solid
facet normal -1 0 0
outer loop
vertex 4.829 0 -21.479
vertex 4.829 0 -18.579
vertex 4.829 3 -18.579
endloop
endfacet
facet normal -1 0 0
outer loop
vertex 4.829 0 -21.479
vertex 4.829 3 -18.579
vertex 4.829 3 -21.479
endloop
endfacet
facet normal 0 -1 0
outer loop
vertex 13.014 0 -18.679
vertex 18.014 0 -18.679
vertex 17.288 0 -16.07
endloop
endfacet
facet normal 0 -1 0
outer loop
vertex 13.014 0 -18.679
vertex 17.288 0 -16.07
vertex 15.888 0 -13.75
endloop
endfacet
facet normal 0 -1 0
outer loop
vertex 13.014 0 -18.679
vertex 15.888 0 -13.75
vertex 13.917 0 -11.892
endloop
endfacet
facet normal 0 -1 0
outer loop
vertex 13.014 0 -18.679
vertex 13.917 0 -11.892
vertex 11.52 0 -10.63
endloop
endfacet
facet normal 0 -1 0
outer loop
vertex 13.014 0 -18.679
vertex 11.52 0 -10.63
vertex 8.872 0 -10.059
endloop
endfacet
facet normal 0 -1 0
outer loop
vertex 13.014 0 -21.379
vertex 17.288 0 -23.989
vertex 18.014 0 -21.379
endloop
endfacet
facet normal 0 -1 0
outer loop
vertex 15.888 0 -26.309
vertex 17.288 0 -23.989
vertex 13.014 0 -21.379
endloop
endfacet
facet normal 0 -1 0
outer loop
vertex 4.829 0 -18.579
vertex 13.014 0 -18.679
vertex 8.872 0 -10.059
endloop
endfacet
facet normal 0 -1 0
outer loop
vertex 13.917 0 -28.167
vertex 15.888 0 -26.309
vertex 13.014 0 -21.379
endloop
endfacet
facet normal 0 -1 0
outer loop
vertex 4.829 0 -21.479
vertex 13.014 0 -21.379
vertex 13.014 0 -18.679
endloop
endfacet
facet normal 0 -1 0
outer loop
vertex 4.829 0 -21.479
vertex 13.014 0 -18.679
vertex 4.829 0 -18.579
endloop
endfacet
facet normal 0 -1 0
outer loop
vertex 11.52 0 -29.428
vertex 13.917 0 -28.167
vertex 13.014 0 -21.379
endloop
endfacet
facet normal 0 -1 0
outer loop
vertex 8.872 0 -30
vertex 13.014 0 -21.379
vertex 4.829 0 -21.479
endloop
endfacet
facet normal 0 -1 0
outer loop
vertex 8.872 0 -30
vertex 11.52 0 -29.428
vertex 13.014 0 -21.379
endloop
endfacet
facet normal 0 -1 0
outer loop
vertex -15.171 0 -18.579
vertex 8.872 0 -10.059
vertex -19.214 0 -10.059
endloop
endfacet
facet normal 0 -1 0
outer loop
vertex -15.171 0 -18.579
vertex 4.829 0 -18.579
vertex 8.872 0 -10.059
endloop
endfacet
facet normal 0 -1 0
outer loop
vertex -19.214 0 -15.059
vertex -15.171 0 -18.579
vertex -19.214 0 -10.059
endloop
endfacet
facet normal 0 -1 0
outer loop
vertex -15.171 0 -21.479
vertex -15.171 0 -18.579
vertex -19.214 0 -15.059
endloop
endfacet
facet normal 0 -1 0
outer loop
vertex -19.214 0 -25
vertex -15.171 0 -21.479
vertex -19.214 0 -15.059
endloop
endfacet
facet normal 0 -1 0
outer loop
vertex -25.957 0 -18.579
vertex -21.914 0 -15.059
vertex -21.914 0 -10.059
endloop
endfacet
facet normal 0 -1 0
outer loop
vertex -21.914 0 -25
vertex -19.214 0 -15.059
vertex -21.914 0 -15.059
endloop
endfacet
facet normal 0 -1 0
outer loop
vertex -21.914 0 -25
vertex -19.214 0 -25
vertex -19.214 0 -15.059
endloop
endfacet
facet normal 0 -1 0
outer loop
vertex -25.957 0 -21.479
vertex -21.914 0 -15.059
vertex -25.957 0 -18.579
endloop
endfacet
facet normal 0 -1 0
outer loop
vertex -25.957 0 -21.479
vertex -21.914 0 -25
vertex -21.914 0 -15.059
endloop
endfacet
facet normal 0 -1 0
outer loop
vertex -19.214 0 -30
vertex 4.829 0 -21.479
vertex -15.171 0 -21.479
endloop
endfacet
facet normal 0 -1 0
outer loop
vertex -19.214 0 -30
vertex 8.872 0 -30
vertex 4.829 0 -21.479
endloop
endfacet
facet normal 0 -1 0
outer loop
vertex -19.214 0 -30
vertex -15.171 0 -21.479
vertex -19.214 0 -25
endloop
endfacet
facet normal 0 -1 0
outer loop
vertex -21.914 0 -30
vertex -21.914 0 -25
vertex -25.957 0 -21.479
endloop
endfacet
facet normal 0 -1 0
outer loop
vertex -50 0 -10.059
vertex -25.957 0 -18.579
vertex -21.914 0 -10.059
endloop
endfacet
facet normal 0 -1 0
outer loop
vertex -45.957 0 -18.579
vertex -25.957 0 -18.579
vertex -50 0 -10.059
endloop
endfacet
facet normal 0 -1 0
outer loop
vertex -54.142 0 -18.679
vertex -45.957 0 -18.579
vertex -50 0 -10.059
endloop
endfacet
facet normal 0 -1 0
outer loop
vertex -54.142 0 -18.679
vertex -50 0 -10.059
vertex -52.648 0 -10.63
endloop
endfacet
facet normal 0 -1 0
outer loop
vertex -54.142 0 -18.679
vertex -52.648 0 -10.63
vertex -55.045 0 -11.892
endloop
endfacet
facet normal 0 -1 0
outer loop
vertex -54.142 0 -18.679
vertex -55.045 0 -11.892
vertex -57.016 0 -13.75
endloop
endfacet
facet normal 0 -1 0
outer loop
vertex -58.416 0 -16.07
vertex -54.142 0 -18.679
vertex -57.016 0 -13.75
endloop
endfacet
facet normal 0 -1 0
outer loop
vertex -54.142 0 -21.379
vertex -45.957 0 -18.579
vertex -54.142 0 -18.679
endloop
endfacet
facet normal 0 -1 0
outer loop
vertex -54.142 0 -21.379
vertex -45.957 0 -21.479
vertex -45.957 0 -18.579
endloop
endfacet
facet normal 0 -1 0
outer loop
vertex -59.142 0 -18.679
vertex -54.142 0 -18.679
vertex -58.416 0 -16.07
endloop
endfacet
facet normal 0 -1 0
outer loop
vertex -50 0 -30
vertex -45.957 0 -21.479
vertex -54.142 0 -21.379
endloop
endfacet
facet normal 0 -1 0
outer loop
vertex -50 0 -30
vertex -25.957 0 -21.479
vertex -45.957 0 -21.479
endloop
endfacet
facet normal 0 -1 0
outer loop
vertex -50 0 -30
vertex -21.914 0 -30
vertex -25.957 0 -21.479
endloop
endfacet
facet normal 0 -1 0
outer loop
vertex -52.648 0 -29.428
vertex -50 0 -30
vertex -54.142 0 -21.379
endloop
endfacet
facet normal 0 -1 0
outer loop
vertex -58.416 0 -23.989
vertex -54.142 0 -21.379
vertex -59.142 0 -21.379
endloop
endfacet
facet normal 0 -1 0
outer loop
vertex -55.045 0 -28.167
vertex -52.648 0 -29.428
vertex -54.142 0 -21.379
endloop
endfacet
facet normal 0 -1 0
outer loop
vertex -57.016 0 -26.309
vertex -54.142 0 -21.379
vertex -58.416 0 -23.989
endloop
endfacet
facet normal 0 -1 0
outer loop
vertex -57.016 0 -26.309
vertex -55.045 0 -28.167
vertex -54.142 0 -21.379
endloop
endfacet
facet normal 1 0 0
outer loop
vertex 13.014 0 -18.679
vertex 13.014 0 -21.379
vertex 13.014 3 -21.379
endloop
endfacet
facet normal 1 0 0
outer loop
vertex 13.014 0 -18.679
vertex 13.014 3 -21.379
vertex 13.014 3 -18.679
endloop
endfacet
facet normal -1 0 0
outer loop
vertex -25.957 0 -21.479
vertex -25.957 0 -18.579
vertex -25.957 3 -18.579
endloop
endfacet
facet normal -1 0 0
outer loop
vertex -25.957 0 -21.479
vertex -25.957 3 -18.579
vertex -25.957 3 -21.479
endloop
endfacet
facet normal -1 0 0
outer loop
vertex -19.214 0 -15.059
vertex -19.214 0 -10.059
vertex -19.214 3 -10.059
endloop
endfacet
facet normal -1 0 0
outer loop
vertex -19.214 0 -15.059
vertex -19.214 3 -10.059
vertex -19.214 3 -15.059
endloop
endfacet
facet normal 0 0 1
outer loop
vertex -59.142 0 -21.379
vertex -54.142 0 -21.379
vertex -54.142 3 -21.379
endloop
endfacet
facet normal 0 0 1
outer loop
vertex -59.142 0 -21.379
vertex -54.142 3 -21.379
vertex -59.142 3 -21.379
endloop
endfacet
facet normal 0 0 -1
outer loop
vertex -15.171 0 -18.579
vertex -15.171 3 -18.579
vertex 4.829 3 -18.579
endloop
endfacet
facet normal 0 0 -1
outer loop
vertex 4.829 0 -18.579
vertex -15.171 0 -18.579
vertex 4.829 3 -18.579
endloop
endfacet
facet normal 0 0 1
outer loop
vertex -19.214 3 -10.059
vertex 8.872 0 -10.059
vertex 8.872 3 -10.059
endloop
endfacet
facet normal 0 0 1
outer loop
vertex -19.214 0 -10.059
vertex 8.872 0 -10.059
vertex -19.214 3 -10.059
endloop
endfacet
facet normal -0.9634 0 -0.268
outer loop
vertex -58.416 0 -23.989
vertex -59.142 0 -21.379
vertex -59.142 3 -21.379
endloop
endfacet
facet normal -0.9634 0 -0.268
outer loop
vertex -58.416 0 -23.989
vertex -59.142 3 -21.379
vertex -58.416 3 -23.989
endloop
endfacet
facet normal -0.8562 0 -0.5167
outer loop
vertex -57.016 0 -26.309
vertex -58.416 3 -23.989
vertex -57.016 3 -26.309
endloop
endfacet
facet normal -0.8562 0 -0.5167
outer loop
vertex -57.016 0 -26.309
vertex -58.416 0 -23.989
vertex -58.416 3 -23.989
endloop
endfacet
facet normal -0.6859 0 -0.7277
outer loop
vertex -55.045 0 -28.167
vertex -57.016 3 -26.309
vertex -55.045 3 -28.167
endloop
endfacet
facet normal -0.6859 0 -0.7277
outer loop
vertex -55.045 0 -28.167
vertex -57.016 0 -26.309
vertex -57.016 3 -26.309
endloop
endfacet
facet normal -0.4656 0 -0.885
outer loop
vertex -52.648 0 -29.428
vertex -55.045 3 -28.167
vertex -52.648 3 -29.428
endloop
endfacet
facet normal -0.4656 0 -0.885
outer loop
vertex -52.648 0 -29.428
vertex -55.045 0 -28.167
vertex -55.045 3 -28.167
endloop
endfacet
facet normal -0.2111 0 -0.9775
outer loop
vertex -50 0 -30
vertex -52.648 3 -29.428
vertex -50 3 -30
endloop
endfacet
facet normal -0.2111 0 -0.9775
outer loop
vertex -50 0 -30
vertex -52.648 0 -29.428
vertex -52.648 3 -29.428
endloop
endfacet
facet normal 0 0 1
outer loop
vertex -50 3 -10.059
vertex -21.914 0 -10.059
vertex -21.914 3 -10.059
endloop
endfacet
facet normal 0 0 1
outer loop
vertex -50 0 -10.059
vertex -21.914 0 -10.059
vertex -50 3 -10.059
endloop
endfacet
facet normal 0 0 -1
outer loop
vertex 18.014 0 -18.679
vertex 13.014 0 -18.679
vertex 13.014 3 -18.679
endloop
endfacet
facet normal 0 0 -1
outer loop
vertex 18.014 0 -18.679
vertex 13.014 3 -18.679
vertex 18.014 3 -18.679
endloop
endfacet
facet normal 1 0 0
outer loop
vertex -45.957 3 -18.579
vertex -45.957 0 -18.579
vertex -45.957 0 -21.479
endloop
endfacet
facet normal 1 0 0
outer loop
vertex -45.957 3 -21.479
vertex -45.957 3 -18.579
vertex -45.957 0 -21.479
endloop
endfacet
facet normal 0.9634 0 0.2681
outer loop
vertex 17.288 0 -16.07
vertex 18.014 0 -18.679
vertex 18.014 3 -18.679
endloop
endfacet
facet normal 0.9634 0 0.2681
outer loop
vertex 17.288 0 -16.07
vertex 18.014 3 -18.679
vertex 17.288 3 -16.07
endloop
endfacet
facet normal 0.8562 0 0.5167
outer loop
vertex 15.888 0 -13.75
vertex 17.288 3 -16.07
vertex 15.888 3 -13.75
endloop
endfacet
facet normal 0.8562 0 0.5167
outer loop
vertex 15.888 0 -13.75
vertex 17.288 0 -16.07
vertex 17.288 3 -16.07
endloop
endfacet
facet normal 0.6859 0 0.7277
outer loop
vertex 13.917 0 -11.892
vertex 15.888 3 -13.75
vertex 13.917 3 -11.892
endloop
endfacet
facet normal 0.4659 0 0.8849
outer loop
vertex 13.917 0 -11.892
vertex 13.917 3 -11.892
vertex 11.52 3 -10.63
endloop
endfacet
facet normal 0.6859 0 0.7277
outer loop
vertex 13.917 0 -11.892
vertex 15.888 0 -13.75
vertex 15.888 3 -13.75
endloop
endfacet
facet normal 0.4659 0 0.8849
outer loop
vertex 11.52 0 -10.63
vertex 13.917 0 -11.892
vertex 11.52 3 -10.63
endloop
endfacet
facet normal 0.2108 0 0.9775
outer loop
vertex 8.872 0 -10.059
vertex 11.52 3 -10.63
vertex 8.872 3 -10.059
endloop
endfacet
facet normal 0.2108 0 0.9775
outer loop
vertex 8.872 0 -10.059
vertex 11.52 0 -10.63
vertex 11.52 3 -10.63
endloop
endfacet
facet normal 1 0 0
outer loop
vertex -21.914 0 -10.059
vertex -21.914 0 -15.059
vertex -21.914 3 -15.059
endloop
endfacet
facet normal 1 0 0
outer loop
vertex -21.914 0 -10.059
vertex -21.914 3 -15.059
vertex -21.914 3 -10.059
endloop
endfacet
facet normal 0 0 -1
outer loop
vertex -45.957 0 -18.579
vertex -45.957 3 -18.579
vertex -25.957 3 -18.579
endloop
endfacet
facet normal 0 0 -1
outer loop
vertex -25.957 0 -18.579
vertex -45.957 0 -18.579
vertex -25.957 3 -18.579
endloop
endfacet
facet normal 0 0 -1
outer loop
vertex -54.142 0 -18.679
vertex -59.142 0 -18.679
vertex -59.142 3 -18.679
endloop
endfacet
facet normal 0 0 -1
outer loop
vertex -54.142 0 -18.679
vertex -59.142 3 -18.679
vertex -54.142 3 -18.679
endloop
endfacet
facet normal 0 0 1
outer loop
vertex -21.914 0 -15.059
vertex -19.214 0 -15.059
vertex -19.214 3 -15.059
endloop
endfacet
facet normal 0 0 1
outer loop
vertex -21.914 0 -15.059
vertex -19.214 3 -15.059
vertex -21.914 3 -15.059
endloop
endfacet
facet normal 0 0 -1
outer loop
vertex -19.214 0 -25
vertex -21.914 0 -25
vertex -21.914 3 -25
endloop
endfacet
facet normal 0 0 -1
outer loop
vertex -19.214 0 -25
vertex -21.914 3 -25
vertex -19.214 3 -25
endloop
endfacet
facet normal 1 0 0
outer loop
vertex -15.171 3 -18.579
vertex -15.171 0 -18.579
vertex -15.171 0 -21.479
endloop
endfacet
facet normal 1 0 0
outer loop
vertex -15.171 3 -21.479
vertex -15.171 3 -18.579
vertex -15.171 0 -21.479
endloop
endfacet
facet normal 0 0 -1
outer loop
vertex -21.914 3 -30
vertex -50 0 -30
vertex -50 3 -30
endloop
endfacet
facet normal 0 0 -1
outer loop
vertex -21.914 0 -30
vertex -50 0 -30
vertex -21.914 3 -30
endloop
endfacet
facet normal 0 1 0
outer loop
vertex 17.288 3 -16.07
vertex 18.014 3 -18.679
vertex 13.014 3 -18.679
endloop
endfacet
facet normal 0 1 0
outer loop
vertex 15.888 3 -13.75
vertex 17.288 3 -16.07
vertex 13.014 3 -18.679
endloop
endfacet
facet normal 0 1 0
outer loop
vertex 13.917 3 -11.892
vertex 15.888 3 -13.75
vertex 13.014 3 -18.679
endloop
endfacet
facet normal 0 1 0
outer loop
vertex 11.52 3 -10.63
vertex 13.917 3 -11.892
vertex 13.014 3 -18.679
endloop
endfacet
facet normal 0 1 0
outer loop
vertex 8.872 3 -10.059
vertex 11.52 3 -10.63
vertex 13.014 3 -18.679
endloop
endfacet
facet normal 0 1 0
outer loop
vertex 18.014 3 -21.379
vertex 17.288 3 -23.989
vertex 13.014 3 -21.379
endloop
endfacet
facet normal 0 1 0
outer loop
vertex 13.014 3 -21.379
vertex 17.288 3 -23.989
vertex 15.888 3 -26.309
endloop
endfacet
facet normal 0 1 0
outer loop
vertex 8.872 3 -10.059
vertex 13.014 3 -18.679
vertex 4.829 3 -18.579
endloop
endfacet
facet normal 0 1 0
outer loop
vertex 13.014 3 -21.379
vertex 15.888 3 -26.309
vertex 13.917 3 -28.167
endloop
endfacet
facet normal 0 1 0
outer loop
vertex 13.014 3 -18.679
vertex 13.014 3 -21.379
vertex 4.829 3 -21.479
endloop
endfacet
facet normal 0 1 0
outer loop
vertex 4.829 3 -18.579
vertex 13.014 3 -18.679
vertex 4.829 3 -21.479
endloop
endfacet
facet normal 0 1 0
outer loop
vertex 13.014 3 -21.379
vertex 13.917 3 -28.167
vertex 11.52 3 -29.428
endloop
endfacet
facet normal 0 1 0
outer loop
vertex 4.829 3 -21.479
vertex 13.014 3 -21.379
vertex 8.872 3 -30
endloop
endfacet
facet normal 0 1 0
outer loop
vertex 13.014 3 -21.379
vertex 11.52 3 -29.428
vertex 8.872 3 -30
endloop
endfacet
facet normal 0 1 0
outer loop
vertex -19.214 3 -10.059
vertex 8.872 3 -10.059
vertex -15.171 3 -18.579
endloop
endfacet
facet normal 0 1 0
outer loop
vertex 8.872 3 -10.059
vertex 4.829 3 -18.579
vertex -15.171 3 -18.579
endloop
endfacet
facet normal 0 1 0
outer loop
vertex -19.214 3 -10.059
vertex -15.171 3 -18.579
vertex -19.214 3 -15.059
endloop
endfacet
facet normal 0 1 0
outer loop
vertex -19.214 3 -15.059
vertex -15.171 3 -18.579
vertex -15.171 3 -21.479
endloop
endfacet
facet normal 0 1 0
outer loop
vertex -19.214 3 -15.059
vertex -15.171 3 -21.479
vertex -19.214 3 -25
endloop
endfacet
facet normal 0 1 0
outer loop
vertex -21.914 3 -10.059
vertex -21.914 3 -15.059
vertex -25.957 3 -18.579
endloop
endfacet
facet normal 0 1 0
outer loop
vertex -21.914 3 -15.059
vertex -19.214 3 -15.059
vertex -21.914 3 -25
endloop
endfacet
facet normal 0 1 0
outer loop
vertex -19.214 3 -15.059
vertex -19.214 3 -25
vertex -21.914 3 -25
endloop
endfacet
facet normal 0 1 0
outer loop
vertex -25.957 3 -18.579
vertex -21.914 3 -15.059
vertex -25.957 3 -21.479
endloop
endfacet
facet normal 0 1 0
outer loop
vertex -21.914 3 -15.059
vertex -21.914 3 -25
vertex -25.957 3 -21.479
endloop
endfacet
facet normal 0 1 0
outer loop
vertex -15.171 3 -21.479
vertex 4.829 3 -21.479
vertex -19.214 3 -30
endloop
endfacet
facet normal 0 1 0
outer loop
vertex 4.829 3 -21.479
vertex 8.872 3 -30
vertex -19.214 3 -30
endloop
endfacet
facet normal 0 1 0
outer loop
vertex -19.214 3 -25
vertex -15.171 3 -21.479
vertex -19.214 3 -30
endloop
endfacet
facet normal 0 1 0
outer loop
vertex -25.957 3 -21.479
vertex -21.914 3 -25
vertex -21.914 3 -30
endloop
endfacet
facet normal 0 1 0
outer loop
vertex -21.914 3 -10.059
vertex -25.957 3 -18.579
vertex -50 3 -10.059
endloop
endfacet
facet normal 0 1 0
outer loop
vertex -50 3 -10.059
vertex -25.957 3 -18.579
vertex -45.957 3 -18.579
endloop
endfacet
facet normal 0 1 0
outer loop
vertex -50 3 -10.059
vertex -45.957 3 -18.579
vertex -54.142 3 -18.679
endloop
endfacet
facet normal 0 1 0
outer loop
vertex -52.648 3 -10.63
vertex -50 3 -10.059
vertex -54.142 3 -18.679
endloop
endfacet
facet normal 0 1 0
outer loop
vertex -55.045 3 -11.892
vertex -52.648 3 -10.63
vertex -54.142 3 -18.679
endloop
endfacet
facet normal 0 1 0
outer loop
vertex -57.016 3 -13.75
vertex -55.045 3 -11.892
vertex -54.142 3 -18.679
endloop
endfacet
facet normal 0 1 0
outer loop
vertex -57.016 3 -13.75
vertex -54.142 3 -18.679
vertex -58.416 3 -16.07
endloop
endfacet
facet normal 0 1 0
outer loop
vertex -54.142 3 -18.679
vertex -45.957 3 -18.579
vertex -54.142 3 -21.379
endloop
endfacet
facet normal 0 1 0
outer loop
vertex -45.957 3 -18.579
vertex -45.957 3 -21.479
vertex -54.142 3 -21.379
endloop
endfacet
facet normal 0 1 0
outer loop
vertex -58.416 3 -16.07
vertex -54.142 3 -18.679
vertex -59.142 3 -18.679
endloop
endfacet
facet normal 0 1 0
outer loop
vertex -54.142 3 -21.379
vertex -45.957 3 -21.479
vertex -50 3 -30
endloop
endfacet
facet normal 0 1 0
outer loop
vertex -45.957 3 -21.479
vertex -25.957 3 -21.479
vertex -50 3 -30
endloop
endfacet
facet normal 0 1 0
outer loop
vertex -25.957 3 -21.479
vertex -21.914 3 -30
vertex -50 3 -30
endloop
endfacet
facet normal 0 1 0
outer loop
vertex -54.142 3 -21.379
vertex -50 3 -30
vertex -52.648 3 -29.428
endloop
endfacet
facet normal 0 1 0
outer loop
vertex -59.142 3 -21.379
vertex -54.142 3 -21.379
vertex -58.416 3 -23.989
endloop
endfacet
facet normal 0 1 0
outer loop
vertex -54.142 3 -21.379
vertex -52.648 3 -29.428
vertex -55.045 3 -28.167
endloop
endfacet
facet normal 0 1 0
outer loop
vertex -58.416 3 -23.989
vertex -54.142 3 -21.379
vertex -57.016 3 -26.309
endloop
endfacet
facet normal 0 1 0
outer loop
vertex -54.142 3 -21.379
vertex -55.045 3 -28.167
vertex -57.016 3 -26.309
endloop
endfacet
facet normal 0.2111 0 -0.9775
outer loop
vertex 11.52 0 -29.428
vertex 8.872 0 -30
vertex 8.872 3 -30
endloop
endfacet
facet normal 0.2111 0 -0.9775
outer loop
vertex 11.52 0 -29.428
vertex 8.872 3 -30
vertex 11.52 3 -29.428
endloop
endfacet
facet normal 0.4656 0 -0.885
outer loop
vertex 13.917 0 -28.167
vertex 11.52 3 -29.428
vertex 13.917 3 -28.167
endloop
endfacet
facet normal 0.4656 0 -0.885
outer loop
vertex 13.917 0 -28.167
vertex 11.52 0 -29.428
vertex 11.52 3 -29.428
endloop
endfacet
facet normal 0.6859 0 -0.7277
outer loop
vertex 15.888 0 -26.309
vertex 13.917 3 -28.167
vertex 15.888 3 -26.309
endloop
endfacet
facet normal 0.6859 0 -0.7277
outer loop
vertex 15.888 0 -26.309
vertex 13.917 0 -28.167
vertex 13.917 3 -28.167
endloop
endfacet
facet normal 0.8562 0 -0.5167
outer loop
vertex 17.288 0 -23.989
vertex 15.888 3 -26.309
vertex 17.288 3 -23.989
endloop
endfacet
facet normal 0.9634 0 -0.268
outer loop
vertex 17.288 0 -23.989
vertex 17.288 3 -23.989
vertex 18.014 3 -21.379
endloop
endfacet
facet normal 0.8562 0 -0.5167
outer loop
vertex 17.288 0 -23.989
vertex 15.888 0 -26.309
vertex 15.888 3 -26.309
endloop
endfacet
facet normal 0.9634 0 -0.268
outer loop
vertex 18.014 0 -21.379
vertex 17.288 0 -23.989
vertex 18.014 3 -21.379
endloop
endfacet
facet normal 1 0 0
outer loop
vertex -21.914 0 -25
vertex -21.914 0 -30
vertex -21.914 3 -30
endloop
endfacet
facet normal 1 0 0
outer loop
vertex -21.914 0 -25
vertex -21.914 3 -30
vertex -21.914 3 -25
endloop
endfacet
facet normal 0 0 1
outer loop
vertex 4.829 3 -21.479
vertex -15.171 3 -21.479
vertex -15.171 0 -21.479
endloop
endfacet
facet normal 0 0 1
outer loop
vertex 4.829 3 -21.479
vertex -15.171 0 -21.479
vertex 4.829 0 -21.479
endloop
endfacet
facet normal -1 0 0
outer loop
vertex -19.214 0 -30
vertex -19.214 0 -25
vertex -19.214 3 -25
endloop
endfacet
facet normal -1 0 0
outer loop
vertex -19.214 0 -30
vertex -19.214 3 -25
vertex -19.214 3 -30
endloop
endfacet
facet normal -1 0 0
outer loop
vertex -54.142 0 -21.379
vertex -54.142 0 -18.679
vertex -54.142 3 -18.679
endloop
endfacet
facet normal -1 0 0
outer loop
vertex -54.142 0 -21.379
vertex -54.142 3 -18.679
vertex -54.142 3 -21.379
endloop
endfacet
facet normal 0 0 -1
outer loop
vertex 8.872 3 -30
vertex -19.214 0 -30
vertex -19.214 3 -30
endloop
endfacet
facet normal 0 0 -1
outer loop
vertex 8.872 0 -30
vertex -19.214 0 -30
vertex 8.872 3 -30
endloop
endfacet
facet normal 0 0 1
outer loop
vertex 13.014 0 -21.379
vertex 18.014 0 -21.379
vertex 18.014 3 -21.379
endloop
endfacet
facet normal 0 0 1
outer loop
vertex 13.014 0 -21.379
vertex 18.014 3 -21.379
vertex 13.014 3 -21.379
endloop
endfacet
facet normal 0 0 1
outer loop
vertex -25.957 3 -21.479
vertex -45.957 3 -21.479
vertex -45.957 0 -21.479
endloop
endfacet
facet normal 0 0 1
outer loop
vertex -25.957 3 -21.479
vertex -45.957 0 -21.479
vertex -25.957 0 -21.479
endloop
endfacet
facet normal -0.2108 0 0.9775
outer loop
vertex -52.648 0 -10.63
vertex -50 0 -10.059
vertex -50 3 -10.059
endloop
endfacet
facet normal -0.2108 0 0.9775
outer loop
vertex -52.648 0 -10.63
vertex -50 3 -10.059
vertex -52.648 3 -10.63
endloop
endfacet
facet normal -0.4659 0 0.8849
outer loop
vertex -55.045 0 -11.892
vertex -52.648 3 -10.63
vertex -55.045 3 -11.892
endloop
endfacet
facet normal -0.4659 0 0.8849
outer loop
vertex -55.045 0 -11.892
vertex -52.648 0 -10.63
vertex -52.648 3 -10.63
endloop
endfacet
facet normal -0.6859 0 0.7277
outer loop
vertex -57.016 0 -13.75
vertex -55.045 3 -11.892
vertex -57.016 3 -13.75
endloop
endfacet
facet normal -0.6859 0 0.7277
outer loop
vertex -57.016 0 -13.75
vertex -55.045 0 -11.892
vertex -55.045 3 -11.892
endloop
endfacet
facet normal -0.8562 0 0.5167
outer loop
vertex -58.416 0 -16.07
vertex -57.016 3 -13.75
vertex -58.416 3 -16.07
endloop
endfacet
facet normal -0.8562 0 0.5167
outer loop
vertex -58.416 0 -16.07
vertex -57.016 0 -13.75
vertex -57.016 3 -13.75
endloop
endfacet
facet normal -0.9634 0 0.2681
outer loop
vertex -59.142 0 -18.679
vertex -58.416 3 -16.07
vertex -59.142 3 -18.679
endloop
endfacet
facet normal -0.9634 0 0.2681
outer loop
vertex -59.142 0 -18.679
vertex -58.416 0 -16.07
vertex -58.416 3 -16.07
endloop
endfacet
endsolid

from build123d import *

# Parameters (mm, degrees)
BOSS_EXTRUDE1_DEPTH = 3
CUT_EXTRUDE1_REACH  = 5
SKETCH2_W           = 20
SKETCH2_H           = 2.9


with BuildPart() as part:
    # Sketch1 → Boss-Extrude1 (new body)
    with BuildSketch(Plane(origin=(0, 0, 0), x_dir=(1, 0, 0), z_dir=(0, 1, 0))):
        with BuildLine():
            Line((-50, 30), (-21.914, 30))
            Line((-21.914, 30), (-21.914, 25))
            Line((-21.914, 25), (-19.214, 25))
            Line((-19.214, 25), (-19.214, 30))
            Line((-19.214, 30), (8.872, 30))
            ThreePointArc((8.872, 30), (14.965992065, 27.304879145), (18.013850136, 21.379427525))
            Line((18.013850136, 21.379427525), (13.013850136, 21.379427525))
            Line((13.013850136, 21.379427525), (13.013850136, 18.679427525))
            Line((13.013850136, 18.679427525), (18.013850136, 18.679427525))
            ThreePointArc((18.013850136, 18.679427525), (14.965992065, 12.753975906), (8.872, 10.058855051))
            Line((8.872, 10.058855051), (-19.214, 10.058855051))
            Line((-19.214, 10.058855051), (-19.214, 15.058855051))
            Line((-19.214, 15.058855051), (-21.914, 15.058855051))
            Line((-21.914, 15.058855051), (-21.914, 10.058855051))
            Line((-21.914, 10.058855051), (-50, 10.058855051))
            ThreePointArc((-50, 10.058855051), (-56.093992065, 12.753975906), (-59.141850136, 18.679427525))
            Line((-59.141850136, 18.679427525), (-54.141850136, 18.679427525))
            Line((-54.141850136, 18.679427525), (-54.141850136, 21.379427525))
            Line((-54.141850136, 21.379427525), (-59.141850136, 21.379427525))
            ThreePointArc((-59.141850136, 21.379427525), (-56.093992065, 27.304879145), (-50, 30))
        make_face()
    extrude(amount=BOSS_EXTRUDE1_DEPTH)

    # Sketch2 → Cut-Extrude1 (cut, up to next)
    with BuildSketch(Plane(origin=(0, 3, 0), x_dir=(1, 0, 0), z_dir=(0, 1, 0)), mode=Mode.PRIVATE) as cut_extrude1_sk1:
        with Locations((-35.957, 20.029427525)):
            Rectangle(SKETCH2_W, SKETCH2_H)
    cut_extrude1_tool1 = extrude(cut_extrude1_sk1.sketch, amount=-CUT_EXTRUDE1_REACH, mode=Mode.PRIVATE) & part.part
    add(cut_extrude1_tool1.solids().sort_by_distance((-35.957, 3, -20.029428))[0], mode=Mode.SUBTRACT)
    # Sketch2 → Cut-Extrude1 (cut, up to next)
    with BuildSketch(Plane(origin=(0, 3, 0), x_dir=(1, 0, 0), z_dir=(0, 1, 0)), mode=Mode.PRIVATE) as cut_extrude1_sk2:
        with Locations((-5.171, 20.029427525)):
            Rectangle(SKETCH2_W, SKETCH2_H)
    cut_extrude1_tool2 = extrude(cut_extrude1_sk2.sketch, amount=-CUT_EXTRUDE1_REACH, mode=Mode.PRIVATE) & part.part
    add(cut_extrude1_tool2.solids().sort_by_distance((-5.171, 3, -20.029428))[0], mode=Mode.SUBTRACT)


solid = part.part
